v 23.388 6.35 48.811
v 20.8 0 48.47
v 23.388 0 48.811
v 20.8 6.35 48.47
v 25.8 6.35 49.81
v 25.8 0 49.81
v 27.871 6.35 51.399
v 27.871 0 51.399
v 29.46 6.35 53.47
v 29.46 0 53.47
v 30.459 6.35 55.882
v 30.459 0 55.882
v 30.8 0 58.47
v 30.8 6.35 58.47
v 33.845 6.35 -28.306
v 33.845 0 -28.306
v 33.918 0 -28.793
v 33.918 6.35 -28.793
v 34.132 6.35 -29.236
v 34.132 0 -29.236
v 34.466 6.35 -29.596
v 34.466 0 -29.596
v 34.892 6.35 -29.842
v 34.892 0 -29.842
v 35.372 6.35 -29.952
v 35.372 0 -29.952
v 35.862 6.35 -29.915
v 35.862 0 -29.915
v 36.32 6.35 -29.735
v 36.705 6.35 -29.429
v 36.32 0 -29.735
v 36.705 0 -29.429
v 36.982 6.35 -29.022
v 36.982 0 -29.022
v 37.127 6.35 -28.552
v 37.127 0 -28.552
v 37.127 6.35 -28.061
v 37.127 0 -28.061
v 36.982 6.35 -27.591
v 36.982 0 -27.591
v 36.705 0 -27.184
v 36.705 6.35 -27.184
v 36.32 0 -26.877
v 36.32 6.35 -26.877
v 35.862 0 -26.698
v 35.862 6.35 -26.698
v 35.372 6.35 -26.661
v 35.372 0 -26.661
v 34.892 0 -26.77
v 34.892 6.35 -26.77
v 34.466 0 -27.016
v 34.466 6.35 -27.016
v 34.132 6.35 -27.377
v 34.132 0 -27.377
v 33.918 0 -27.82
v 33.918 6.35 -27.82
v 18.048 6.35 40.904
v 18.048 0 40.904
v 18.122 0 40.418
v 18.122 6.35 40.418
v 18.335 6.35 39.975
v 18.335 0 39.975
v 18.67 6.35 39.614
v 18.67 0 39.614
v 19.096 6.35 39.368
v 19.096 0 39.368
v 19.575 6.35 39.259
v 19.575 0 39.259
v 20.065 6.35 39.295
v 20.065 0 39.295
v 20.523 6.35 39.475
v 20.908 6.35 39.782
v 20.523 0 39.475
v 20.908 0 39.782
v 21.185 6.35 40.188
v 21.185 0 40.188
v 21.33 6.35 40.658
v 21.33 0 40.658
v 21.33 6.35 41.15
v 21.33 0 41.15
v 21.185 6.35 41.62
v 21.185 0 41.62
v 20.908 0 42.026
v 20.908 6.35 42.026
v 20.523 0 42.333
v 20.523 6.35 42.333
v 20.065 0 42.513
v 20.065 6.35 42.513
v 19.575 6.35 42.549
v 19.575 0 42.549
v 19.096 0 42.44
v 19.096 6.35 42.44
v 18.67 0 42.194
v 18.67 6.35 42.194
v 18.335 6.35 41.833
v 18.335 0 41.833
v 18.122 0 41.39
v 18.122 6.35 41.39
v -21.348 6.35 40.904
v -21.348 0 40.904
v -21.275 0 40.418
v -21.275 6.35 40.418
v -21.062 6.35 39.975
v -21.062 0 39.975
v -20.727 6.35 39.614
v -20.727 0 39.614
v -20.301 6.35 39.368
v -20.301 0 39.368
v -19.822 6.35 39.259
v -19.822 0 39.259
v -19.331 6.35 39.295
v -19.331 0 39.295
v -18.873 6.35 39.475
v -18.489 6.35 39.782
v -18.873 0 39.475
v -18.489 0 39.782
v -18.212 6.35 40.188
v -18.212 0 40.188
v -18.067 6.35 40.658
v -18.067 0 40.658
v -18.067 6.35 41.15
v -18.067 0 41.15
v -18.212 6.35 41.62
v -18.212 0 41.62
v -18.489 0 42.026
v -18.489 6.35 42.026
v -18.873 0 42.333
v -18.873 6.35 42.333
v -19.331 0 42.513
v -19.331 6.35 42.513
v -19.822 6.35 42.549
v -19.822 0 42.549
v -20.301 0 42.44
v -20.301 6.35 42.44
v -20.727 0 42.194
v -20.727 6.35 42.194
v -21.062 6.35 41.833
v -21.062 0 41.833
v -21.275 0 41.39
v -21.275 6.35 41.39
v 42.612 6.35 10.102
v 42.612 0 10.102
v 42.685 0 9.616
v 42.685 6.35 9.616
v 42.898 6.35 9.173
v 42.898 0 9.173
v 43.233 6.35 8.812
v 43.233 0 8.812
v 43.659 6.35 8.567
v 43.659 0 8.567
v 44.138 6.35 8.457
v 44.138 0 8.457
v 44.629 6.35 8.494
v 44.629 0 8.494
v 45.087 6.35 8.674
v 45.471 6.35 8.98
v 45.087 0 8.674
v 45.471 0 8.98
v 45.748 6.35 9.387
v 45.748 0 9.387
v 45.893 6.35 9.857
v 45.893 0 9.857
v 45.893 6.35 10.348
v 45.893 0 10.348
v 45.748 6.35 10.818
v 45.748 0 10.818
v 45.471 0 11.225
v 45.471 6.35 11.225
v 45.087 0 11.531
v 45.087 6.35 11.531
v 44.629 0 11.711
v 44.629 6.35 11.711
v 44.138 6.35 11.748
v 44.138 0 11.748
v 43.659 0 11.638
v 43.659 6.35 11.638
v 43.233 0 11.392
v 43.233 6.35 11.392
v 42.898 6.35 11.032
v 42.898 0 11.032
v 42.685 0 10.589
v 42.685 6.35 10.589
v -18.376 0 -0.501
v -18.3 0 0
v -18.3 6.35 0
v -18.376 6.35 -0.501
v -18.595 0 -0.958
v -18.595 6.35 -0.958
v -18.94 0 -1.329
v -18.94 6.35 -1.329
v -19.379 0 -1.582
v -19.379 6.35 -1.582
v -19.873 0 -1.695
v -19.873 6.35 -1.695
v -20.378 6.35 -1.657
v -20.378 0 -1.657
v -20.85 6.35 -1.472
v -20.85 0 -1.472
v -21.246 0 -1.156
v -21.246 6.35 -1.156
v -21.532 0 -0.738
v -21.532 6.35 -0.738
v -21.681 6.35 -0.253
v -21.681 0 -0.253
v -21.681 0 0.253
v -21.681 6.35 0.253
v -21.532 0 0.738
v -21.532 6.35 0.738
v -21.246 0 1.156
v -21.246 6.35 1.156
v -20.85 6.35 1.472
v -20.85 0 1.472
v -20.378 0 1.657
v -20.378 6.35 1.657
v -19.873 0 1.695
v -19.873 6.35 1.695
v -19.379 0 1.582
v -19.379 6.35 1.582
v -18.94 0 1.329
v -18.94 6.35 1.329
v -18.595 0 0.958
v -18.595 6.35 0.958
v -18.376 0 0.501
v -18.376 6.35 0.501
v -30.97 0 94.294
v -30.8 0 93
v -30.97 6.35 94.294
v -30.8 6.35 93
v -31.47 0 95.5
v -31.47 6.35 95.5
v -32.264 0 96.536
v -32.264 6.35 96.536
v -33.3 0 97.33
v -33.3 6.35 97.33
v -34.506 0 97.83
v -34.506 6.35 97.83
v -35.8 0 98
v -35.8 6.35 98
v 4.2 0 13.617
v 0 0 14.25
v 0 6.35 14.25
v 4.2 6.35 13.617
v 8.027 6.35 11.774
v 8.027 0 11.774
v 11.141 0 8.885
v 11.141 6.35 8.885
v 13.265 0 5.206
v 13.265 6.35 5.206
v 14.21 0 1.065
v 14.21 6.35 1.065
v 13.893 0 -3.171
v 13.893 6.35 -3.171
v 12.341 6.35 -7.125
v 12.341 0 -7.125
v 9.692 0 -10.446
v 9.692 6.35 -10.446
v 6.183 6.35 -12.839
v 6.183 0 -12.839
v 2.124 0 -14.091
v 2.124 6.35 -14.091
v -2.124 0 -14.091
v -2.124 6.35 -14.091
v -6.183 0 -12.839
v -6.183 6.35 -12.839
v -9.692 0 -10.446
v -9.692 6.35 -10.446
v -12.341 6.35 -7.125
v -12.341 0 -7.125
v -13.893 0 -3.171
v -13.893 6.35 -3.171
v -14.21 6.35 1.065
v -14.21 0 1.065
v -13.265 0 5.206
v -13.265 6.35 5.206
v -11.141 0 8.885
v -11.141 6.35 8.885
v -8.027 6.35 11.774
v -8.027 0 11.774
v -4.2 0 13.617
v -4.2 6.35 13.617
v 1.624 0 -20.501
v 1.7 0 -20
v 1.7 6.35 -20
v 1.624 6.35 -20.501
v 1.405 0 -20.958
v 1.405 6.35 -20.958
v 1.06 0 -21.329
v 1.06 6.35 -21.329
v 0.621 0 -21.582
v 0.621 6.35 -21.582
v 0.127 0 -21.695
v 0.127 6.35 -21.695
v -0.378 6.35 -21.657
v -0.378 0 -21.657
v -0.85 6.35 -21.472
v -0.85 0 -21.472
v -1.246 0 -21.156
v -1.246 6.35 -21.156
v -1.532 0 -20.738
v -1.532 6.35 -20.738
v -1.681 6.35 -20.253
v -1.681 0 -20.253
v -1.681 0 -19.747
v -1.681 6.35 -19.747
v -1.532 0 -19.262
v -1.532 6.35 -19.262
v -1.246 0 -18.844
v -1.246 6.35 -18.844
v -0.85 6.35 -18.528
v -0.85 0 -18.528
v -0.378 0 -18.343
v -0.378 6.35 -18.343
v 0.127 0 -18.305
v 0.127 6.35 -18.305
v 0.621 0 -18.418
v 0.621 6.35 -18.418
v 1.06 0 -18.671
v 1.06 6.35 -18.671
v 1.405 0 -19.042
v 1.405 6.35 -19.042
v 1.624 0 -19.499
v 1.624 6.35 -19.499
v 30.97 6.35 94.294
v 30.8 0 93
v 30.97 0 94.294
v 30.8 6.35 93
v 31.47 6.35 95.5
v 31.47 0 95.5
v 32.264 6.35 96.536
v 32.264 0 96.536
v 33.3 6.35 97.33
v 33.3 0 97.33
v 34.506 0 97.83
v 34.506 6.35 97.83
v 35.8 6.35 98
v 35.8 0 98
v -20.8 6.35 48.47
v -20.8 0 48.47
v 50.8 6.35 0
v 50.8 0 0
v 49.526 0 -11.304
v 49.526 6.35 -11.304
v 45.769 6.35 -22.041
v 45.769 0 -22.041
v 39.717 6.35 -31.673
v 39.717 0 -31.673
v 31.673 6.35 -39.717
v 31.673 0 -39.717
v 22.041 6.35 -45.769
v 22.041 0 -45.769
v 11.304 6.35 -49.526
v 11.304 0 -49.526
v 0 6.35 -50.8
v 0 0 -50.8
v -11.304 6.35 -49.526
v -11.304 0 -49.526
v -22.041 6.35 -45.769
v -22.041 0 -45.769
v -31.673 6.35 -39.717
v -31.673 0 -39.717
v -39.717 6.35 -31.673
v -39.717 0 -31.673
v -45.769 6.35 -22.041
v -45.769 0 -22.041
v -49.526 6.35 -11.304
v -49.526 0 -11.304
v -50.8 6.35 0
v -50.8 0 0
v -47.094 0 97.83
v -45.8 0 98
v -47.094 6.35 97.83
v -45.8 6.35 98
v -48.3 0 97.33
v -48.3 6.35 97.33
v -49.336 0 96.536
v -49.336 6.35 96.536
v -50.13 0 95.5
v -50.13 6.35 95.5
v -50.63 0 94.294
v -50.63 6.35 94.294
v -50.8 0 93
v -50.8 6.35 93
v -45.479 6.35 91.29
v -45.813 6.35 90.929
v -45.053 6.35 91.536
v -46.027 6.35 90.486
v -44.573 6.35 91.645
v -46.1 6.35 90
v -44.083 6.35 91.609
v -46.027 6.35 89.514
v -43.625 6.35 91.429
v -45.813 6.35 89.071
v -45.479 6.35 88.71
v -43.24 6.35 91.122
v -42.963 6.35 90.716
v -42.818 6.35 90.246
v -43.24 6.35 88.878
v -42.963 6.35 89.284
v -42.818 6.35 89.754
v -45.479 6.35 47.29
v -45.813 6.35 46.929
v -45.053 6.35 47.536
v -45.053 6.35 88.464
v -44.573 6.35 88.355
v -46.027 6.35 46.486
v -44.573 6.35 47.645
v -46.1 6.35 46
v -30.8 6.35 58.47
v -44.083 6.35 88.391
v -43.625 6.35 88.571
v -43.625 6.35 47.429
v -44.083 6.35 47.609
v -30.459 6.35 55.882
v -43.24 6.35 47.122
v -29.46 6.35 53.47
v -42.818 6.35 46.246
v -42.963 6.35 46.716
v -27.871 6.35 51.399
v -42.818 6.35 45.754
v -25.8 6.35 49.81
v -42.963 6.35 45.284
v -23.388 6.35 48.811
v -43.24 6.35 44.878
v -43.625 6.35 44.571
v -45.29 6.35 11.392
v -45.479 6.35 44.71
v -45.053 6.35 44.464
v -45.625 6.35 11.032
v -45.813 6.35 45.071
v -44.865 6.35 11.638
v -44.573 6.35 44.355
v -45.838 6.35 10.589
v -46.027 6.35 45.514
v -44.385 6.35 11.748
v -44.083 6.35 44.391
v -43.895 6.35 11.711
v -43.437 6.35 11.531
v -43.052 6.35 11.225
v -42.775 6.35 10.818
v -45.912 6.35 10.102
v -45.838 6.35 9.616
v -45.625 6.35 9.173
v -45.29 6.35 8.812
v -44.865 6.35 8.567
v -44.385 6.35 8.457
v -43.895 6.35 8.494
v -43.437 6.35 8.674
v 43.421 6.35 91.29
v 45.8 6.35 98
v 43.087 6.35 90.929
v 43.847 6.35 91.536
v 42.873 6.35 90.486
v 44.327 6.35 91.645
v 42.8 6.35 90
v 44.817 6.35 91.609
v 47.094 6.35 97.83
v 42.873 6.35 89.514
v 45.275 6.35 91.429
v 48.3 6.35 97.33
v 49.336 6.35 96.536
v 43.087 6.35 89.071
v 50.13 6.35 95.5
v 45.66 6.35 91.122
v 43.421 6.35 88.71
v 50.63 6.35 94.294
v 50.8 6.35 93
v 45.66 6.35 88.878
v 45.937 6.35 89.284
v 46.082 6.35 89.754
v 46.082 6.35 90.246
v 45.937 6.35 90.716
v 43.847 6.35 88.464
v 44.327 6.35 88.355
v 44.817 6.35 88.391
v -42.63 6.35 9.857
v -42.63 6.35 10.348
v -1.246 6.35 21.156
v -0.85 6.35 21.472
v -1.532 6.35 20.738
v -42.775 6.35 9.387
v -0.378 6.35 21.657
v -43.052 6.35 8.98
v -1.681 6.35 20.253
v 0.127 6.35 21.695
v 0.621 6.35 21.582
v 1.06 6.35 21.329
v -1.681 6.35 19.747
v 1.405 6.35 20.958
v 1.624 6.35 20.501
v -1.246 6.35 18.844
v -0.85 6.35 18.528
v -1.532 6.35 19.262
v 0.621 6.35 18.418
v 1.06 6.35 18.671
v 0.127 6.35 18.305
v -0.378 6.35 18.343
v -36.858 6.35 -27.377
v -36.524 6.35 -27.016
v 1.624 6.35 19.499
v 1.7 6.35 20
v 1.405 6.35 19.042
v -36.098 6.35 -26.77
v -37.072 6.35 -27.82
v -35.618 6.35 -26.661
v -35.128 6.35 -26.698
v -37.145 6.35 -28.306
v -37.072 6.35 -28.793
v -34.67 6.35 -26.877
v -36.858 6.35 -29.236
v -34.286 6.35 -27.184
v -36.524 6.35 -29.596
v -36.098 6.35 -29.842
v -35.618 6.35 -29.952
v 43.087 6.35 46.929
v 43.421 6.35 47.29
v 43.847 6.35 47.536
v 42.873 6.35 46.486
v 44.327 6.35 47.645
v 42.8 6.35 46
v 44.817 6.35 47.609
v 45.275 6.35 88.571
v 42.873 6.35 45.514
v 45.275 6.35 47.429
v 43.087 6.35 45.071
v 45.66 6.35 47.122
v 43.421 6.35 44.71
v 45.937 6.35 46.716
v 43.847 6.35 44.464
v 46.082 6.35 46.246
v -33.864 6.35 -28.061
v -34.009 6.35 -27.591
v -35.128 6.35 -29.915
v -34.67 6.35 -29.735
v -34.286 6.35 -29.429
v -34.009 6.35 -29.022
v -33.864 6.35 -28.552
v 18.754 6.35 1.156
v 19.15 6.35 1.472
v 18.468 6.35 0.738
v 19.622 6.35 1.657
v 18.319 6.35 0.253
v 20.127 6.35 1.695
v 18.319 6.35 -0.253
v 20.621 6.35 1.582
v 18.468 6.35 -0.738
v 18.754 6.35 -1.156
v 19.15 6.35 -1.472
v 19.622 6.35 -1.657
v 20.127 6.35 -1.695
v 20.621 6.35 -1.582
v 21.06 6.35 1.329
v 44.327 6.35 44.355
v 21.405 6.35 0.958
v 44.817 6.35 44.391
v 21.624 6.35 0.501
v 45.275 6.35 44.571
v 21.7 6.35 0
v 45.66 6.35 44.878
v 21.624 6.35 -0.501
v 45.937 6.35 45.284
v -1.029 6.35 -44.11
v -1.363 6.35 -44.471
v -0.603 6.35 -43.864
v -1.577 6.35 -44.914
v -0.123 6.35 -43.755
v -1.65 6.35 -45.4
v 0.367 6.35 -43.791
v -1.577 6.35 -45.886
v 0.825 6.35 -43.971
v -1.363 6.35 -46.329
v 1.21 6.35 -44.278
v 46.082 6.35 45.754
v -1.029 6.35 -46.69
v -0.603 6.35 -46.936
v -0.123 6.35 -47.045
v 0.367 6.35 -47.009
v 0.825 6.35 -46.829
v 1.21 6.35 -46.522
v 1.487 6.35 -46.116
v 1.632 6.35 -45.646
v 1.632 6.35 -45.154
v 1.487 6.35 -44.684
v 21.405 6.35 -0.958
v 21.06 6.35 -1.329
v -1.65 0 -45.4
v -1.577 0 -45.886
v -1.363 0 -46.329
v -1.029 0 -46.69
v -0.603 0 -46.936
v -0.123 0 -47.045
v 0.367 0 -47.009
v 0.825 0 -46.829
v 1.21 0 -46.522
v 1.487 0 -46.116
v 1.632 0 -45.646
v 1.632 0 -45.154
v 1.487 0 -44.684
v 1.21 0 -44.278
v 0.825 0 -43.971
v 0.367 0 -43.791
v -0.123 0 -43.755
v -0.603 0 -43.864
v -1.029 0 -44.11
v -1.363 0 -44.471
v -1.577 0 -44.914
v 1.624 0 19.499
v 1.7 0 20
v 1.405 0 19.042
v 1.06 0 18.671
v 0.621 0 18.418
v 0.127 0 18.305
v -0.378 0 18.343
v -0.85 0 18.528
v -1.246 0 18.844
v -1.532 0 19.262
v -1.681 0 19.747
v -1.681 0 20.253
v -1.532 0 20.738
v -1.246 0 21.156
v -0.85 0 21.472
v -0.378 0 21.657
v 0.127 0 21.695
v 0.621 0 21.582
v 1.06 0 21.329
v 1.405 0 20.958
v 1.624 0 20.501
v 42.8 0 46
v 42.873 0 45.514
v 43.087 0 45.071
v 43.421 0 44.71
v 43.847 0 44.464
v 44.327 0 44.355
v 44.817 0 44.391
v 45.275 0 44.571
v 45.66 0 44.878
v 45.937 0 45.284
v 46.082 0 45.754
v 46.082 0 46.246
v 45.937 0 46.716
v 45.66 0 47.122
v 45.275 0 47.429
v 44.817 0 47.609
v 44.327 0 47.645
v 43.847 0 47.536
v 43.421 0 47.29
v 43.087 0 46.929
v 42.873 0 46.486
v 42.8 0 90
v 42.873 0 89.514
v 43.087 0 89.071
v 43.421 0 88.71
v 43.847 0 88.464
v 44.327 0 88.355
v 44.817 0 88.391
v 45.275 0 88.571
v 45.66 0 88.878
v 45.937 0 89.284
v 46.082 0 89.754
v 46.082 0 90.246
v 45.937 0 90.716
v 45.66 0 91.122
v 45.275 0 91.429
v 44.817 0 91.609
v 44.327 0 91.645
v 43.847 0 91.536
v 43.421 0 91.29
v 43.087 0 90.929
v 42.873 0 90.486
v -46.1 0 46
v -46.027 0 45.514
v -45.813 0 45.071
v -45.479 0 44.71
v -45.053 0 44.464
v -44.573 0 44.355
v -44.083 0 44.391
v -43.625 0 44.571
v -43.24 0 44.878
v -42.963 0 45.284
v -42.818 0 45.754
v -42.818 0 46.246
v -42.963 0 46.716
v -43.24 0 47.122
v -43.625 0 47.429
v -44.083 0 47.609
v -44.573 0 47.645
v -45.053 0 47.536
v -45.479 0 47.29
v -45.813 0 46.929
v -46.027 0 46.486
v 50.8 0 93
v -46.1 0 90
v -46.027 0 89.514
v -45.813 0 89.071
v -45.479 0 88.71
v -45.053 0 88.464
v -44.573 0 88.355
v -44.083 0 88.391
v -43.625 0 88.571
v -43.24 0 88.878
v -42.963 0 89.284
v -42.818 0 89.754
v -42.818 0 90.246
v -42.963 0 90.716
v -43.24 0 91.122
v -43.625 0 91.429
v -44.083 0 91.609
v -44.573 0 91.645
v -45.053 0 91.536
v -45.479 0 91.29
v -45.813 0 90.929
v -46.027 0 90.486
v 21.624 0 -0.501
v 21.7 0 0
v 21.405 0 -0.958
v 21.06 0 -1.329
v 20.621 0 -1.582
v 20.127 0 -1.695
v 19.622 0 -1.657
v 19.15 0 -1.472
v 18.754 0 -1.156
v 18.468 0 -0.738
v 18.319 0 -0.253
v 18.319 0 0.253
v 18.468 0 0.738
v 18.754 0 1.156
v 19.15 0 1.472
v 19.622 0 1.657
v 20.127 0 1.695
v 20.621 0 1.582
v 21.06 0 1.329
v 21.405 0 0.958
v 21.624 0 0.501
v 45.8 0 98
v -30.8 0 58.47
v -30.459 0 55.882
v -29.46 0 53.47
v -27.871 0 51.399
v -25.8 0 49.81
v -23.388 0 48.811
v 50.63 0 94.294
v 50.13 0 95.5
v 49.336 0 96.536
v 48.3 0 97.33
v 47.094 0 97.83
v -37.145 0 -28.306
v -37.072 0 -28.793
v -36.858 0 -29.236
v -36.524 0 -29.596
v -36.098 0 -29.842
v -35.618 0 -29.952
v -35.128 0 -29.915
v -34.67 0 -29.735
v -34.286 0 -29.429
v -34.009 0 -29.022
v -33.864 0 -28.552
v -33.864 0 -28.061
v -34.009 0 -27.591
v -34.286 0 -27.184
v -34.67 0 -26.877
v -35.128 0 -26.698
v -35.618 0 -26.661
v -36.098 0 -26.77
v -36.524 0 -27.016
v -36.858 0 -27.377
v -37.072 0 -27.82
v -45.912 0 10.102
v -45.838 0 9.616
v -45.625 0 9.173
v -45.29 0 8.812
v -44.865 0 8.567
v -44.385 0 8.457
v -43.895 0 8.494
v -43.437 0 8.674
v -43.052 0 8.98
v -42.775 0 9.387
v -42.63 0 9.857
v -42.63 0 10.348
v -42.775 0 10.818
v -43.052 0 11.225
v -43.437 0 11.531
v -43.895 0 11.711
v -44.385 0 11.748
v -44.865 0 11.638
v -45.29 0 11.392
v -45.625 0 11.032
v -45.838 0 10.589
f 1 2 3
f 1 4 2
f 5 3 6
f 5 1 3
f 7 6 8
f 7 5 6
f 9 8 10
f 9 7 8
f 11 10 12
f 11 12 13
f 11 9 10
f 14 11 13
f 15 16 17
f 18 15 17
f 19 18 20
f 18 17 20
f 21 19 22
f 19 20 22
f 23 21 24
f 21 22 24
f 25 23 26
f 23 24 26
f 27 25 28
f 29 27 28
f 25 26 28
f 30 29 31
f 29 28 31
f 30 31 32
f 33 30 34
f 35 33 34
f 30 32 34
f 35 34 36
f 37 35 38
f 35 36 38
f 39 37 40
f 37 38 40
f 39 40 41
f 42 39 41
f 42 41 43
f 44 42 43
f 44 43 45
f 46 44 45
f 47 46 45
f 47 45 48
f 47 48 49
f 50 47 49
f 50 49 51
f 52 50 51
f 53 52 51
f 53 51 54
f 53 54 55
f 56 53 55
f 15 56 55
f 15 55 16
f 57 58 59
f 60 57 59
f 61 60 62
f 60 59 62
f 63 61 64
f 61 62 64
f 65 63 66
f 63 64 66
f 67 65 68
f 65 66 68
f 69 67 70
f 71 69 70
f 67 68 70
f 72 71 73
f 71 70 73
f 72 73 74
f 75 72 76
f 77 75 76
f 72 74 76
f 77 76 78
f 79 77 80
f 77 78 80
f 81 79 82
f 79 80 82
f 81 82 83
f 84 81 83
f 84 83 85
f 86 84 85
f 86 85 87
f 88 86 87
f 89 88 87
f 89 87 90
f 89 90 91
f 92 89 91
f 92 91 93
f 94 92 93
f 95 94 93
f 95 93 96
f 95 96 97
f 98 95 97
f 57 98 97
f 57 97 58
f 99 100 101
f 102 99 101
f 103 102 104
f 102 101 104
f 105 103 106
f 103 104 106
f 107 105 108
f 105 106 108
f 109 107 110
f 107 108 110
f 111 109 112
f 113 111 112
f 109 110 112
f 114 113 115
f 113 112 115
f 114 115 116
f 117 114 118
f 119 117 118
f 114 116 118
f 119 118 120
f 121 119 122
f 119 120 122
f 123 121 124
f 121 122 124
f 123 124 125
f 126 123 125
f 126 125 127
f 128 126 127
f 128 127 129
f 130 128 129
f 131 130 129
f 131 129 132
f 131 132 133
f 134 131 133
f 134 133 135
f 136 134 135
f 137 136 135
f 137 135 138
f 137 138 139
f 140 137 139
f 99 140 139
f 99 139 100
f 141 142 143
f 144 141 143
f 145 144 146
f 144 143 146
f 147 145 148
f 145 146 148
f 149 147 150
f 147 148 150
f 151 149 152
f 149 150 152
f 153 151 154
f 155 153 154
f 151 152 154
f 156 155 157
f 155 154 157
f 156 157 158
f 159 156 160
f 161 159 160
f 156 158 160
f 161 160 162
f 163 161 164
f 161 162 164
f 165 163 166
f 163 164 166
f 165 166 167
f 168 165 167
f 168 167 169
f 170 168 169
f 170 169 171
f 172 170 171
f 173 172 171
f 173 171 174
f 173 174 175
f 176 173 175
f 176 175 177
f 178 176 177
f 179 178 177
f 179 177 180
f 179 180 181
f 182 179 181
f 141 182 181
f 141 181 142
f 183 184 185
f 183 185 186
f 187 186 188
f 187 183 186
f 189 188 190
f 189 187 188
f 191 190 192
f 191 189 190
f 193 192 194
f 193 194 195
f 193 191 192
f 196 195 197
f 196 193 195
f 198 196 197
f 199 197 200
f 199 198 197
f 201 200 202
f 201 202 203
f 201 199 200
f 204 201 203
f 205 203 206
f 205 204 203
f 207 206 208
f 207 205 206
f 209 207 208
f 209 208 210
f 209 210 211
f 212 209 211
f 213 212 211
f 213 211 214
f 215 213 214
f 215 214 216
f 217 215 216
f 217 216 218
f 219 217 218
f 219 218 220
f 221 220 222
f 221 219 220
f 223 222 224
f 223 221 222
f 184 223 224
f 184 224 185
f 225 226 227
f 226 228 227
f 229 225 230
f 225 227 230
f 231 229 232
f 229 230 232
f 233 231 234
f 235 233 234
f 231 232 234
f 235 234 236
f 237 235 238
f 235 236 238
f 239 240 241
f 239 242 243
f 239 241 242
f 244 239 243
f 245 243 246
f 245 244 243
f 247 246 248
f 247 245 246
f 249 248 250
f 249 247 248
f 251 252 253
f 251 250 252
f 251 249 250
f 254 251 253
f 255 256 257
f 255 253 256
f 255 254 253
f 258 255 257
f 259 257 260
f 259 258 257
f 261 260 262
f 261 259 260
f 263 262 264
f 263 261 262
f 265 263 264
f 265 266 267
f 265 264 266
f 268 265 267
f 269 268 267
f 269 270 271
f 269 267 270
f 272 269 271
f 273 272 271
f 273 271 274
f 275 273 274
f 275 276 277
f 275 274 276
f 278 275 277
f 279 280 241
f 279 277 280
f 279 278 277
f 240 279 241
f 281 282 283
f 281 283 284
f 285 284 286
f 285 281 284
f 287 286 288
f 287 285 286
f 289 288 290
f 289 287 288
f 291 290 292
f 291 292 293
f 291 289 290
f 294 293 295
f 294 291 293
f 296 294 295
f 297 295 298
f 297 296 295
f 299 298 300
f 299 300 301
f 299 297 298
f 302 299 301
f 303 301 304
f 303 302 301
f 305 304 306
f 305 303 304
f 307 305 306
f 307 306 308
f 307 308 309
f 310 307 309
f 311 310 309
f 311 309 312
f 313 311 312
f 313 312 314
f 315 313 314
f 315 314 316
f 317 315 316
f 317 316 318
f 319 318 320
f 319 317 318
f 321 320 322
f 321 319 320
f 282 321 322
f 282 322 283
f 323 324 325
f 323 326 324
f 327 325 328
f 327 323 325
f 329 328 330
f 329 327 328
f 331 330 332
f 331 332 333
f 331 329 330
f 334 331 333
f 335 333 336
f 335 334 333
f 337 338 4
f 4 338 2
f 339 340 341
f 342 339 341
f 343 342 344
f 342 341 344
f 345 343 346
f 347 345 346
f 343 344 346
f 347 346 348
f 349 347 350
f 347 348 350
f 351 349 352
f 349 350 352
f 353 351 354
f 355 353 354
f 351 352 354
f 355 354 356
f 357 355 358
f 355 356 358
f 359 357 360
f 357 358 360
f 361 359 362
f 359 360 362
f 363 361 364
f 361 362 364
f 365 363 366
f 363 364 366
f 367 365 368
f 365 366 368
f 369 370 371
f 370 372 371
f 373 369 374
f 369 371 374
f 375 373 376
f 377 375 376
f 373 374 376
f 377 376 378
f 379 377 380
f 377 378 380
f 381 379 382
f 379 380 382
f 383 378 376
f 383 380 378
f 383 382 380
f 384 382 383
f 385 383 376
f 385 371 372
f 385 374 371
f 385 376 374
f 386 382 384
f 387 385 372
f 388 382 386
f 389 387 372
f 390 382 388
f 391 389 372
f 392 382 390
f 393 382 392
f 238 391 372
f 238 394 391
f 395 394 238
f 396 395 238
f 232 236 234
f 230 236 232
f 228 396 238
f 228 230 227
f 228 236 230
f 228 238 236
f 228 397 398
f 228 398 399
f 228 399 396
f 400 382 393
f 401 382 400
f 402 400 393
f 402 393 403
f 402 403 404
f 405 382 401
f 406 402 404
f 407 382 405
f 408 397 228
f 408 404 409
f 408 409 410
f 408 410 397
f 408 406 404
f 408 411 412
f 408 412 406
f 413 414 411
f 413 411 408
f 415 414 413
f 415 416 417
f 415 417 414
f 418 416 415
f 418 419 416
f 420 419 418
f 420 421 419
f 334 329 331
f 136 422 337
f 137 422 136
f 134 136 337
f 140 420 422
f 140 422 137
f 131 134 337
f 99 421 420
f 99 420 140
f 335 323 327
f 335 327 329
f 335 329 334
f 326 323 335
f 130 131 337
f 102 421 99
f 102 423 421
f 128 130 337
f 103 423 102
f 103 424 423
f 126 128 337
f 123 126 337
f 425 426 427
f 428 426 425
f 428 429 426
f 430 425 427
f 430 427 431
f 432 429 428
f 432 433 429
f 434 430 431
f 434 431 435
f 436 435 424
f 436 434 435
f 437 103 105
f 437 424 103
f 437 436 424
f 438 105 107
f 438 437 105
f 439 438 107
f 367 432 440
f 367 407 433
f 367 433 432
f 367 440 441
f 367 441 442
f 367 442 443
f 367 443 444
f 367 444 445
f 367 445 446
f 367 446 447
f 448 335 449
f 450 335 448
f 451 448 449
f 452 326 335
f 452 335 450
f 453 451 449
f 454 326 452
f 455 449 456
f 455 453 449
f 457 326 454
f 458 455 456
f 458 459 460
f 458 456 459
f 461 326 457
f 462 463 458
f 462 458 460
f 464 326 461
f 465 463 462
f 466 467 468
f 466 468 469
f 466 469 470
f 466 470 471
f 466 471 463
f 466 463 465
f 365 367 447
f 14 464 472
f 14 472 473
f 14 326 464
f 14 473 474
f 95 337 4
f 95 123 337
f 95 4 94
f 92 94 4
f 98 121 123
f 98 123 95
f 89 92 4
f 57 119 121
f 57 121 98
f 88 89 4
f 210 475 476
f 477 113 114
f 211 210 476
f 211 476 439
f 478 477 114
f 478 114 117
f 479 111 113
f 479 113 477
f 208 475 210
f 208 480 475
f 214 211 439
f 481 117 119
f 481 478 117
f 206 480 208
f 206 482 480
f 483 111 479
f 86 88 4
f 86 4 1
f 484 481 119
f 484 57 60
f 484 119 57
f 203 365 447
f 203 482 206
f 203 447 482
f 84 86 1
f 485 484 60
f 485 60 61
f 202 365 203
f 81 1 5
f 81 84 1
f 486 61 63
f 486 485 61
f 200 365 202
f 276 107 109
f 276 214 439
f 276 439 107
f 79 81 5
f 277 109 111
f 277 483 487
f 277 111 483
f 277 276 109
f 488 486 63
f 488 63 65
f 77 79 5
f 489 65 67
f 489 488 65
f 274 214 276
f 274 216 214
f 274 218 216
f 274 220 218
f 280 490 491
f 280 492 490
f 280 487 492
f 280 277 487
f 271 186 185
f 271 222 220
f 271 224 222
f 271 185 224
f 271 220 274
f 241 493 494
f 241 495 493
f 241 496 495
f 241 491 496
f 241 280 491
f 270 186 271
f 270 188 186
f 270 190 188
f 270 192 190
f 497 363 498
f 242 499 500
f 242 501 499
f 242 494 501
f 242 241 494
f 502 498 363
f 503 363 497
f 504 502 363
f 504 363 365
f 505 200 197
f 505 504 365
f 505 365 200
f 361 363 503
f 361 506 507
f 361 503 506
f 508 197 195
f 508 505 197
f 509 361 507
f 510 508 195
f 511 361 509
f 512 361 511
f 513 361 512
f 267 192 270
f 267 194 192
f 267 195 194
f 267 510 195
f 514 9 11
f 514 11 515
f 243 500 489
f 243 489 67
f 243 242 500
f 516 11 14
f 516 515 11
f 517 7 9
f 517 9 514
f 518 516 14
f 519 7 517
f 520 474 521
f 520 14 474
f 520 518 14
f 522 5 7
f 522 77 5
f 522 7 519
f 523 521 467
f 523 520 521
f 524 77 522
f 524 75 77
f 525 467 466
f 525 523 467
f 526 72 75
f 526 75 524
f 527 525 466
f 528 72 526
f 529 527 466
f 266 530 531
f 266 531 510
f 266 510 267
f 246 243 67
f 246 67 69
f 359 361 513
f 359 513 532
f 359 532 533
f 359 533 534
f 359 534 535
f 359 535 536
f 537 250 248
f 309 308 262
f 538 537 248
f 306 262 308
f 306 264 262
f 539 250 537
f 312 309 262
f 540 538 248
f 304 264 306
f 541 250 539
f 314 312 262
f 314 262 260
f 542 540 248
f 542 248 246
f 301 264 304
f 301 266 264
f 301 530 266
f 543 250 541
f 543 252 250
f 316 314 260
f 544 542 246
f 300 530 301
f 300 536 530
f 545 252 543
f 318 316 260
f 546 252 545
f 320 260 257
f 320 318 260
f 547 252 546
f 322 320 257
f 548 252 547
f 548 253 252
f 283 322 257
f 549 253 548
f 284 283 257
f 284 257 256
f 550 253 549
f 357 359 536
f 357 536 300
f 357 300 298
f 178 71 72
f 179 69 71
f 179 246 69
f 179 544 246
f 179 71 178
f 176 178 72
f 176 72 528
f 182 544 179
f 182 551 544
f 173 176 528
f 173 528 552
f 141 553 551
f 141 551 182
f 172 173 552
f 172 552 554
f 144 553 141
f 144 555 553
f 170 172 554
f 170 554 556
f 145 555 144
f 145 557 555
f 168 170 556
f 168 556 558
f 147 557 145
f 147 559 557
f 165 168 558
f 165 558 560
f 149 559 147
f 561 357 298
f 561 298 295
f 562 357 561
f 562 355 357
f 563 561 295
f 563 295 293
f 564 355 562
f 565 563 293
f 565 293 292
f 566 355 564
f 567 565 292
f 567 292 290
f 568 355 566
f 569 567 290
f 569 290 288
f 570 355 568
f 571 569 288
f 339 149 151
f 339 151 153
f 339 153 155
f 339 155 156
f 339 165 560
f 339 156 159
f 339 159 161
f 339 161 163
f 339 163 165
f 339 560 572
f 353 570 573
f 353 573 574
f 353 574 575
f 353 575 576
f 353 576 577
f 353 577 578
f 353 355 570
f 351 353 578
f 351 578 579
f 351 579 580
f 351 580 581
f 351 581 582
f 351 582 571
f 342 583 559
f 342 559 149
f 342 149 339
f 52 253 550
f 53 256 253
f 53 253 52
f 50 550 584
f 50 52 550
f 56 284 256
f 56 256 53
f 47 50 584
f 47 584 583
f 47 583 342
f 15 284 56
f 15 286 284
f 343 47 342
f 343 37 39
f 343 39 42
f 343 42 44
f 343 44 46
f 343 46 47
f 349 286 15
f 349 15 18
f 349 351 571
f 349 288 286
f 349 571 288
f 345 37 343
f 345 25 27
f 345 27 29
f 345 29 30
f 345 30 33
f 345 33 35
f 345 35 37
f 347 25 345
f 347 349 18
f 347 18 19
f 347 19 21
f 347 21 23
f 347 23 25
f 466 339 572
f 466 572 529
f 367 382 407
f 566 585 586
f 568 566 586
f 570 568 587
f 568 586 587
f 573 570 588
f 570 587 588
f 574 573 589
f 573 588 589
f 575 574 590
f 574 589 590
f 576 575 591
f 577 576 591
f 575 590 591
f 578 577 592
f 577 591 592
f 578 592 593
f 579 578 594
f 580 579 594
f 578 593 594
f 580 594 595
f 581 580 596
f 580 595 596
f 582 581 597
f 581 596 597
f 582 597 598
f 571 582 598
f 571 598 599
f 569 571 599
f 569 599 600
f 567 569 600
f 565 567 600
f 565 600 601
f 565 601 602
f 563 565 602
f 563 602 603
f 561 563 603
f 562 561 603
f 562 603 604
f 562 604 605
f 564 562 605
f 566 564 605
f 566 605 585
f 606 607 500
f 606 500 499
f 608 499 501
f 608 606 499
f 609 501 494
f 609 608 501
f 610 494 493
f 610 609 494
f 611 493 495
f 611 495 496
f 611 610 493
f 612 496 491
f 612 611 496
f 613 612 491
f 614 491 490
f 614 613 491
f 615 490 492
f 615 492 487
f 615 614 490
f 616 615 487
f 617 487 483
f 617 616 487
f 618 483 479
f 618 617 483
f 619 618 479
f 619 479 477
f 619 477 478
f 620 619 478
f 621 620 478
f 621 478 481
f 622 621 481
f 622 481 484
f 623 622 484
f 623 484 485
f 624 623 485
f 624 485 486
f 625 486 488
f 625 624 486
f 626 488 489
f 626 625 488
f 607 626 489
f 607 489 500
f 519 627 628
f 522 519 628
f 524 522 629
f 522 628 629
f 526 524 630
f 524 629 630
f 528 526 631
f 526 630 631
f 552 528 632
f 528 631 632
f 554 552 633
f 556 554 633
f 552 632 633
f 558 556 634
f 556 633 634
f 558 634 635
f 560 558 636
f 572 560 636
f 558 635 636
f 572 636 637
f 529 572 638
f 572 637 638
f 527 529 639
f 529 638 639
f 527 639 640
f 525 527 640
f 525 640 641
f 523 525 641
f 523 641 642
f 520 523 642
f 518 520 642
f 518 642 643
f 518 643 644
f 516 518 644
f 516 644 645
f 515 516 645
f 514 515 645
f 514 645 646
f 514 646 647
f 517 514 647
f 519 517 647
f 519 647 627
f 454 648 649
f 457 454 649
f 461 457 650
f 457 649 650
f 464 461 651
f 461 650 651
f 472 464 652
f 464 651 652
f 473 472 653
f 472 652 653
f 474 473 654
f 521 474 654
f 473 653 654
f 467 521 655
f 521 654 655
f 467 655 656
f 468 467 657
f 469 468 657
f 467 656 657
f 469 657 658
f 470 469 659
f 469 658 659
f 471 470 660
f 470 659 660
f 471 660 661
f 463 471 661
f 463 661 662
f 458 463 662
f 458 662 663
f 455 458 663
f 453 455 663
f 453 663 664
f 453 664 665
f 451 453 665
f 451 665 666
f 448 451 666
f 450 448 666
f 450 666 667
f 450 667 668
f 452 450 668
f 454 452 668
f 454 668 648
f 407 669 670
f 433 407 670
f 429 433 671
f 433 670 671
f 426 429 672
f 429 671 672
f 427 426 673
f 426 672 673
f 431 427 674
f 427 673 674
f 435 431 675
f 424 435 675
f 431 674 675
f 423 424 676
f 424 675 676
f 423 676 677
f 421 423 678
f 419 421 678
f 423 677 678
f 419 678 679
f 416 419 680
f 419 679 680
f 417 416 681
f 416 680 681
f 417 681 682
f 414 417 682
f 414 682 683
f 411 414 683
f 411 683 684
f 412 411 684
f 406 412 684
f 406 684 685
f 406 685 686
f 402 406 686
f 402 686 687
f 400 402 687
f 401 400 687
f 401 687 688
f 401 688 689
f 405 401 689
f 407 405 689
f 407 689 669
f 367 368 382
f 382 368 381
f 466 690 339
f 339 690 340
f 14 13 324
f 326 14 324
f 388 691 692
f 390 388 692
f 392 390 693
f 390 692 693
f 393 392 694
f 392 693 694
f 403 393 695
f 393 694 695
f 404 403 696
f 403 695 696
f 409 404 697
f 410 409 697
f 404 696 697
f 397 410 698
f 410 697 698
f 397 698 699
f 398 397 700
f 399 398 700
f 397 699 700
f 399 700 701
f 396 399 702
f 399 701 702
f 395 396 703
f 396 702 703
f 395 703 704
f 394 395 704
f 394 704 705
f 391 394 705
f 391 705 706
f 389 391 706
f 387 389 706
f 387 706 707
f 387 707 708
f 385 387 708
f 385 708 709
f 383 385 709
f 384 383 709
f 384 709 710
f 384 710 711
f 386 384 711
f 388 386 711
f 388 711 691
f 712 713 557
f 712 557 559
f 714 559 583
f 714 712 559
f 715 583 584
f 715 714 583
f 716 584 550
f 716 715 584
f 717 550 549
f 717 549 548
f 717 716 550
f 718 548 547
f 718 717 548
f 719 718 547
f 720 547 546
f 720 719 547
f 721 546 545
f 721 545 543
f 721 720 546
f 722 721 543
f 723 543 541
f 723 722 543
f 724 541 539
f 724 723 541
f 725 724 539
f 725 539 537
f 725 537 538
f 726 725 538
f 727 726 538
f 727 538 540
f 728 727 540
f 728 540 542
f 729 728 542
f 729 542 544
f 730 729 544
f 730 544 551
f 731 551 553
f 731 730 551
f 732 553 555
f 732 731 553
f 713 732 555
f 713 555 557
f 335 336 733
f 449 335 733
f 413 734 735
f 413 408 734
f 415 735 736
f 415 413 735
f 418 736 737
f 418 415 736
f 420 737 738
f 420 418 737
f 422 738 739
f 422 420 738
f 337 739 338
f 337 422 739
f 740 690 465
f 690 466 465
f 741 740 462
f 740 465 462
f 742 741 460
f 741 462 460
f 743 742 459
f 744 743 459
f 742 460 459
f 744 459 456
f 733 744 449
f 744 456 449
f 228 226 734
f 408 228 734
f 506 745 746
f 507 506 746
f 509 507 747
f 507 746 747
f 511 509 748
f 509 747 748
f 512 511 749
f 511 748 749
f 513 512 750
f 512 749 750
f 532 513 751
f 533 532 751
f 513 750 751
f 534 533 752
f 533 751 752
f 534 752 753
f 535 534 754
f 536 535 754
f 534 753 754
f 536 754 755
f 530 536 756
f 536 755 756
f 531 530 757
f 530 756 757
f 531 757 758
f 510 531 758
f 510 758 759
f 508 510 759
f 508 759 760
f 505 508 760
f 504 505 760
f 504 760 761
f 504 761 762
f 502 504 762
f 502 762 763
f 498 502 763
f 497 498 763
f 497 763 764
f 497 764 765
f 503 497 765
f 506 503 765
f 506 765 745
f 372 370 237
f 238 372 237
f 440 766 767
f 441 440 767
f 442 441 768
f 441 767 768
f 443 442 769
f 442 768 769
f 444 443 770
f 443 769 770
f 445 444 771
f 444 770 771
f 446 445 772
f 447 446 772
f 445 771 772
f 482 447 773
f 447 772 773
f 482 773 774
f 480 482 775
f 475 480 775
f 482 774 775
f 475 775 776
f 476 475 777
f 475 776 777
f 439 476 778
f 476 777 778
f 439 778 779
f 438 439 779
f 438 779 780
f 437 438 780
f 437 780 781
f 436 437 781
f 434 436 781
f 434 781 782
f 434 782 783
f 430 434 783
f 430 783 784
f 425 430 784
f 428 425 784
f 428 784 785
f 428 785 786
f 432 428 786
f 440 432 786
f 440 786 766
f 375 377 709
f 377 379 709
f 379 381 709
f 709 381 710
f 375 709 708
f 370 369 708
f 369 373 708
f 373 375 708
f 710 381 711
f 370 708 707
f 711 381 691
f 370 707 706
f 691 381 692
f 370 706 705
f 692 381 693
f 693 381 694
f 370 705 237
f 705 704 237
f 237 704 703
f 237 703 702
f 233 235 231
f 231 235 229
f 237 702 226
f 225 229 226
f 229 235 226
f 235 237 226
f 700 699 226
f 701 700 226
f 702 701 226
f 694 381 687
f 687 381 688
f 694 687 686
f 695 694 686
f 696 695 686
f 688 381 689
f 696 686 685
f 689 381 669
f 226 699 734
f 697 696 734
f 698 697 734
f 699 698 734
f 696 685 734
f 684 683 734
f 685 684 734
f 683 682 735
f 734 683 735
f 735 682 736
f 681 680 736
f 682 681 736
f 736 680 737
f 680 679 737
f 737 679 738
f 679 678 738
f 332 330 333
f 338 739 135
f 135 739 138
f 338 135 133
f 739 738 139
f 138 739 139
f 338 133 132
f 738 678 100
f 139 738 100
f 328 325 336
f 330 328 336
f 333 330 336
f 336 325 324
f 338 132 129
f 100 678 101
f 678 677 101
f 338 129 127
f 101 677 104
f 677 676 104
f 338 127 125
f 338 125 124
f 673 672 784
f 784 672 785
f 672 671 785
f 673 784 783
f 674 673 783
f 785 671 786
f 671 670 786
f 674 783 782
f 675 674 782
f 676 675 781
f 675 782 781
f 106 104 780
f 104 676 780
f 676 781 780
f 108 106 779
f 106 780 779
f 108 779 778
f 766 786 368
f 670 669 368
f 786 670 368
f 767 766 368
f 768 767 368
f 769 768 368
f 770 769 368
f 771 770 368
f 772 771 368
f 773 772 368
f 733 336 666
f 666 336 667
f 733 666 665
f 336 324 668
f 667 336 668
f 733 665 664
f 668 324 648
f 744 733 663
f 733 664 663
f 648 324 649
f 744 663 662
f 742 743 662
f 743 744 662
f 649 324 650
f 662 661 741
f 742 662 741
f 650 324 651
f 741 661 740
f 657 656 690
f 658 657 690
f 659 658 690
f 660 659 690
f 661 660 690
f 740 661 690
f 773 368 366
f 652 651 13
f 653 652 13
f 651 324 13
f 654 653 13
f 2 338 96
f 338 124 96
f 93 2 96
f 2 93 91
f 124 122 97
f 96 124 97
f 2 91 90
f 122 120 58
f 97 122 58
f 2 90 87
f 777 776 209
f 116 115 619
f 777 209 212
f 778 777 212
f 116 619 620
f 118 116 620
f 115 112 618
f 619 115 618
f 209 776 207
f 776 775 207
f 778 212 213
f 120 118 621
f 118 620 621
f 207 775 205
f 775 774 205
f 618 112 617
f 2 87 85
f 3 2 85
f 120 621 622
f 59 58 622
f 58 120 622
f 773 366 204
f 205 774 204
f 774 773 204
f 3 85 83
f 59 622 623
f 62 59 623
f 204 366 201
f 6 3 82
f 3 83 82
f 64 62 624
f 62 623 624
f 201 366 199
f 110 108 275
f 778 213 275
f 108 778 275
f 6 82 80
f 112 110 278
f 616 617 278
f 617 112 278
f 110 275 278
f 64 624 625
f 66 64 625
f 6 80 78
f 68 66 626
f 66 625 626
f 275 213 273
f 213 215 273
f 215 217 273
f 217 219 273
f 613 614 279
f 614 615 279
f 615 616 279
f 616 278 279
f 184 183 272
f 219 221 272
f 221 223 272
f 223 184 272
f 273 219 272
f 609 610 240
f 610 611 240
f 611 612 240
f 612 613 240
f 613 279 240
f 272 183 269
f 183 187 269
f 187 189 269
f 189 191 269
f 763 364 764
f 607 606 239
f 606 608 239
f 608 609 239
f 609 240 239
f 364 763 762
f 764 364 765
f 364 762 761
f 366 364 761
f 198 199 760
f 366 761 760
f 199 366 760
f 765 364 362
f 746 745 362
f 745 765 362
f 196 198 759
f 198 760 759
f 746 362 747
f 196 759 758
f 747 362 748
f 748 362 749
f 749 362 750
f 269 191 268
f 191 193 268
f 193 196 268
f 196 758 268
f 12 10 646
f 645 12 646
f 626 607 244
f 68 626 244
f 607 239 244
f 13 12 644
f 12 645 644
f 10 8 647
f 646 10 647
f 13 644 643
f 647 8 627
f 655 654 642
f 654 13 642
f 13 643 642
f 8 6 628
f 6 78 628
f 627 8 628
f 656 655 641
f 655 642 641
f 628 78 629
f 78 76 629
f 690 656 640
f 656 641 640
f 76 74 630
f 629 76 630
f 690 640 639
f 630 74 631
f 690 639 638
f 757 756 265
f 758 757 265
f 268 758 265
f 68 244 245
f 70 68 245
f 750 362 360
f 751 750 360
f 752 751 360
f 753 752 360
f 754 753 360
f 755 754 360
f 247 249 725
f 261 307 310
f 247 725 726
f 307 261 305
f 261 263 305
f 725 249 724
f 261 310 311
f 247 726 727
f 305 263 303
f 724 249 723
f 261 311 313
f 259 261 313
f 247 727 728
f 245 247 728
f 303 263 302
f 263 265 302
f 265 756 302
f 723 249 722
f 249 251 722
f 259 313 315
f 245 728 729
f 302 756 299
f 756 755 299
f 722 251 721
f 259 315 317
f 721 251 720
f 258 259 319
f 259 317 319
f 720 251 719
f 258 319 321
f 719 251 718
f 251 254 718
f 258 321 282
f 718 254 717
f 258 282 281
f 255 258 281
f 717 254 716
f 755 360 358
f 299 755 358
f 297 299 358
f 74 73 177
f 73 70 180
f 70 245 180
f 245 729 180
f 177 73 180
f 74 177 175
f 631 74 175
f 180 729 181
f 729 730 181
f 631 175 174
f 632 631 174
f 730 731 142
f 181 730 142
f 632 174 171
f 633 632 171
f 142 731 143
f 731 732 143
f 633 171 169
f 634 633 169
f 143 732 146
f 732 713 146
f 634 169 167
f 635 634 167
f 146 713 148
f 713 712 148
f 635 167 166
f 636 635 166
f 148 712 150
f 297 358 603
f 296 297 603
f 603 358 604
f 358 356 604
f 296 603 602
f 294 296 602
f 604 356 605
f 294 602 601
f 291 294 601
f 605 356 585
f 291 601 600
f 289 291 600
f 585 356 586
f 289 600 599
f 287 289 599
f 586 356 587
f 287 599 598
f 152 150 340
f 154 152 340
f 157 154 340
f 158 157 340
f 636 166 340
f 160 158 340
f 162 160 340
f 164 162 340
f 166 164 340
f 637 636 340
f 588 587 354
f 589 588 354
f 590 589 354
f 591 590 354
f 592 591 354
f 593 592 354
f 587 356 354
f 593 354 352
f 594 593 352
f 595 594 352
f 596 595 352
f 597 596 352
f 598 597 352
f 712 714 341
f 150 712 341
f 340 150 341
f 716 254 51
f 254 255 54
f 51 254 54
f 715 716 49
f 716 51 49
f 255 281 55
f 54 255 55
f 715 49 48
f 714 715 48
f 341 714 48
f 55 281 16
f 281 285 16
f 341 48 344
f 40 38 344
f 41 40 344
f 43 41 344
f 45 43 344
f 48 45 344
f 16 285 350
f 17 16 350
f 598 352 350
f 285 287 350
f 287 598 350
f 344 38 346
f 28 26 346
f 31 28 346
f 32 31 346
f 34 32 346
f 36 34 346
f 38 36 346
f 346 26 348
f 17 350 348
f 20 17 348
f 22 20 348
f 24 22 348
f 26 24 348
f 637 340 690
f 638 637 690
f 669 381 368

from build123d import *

# Parameters (mm, degrees)
BOSS_EXTRUDE1_DEPTH          = 6.35
FILLET1_R                    = 10
M4X0_7_TAPPED_HOLE1_D        = 3.3
M4X0_7_TAPPED_HOLE2_D        = 3.3
FILLET2_R                    = 5
CUT_EXTRUDE1_DEPTH           = 111.566552356
CUT_EXTRUDE1_DEPTH_BACK      = 111.566552356
SKETCH10_R                   = 14.25
M3_CLEARANCE_HOLE1_OUTLINE_R = 1.7
M3_CLEARANCE_HOLE1_DEPTH     = 6.35


# Read off the part's stored shape, not the designer's step: M3 Clearance Hole1
with BuildPart() as part:
    # Sketch2 → Boss-Extrude1 (new body)
    with BuildSketch(Plane(origin=(0, 0, 0), x_dir=(1, 0, 0), z_dir=(0, 1, 0))):
        with BuildLine():
            Line((-36.071416662, -35.77), (-50.8, -35.77))
            Line((-50.8, -35.77), (-50.8, -98))
            Line((-50.8, -98), (-30.8, -98))
            Line((-30.8, -98), (-30.8, -48.47))
            Line((-30.8, -48.47), (-15.208520638, -48.47))
            ThreePointArc((-15.208520638, -48.47), (-26.414588628, -43.392505201), (-36.071416662, -35.77))
        make_face()
        with BuildLine():
            Line((0, -35.77), (-36.071416662, -35.77))
            ThreePointArc((-36.071416662, -35.77), (-26.414588628, -43.392505201), (-15.208520638, -48.47))
            Line((-15.208520638, -48.47), (0, -48.47))
            Line((0, -48.47), (0, -35.77))
        make_face()
        with BuildLine():
            Line((36.071416662, -35.77), (0, -35.77))
            Line((0, -35.77), (0, -48.47))
            Line((0, -48.47), (15.208520638, -48.47))
            ThreePointArc((15.208520638, -48.47), (26.414588628, -43.392505201), (36.071416662, -35.77))
        make_face()
        with BuildLine():
            Line((50.8, -98), (50.8, -35.77))
            Line((50.8, -35.77), (36.071416662, -35.77))
            ThreePointArc((36.071416662, -35.77), (26.414588628, -43.392505201), (15.208520638, -48.47))
            Line((15.208520638, -48.47), (30.8, -48.47))
            Line((30.8, -48.47), (30.8, -98))
            Line((30.8, -98), (50.8, -98))
        make_face()
        with BuildLine():
            Line((50.8, -35.77), (50.8, 0))
            ThreePointArc((50.8, 0), (46.973758453, -19.34182041), (36.071416662, -35.77))
            Line((36.071416662, -35.77), (50.8, -35.77))
        make_face()
        with BuildLine():
            Line((50.8, 0), (0, 0))
            Line((0, 0), (0, -35.77))
            Line((0, -35.77), (36.071416662, -35.77))
            ThreePointArc((36.071416662, -35.77), (46.973758453, -19.34182041), (50.8, 0))
        make_face()
        with BuildLine():
            ThreePointArc((50.8, 0), (0, 50.8), (-50.8, 0))
            Line((-50.8, 0), (0, 0))
            Line((0, 0), (50.8, 0))
        make_face()
        with BuildLine():
            Line((0, 0), (-50.8, 0))
            ThreePointArc((-50.8, 0), (-46.973758453, -19.34182041), (-36.071416662, -35.77))
            Line((-36.071416662, -35.77), (0, -35.77))
            Line((0, -35.77), (0, 0))
        make_face()
        with BuildLine():
            ThreePointArc((-36.071416662, -35.77), (-46.973758453, -19.34182041), (-50.8, 0))
            Line((-50.8, 0), (-50.8, -35.77))
            Line((-50.8, -35.77), (-36.071416662, -35.77))
        make_face()
    extrude(amount=BOSS_EXTRUDE1_DEPTH)

    # Fillet1
    fillet1_edges = [part.edges().sort_by_distance(p)[0] for p in [
        (30.8, 3.175, 48.47),
        (-30.8, 3.175, 48.47),
    ]]
    fillet(fillet1_edges, radius=FILLET1_R)

    # M4x0.7 Tapped Hole1 (through all)
    with Locations(Plane(origin=(0, 6.35, 0), x_dir=(1, 0, 0), z_dir=(0, 1, 0))):
        with Locations((-44.45, -46), (-44.45, -90), (44.45, -90), (44.45, -46)):
            Hole(M4X0_7_TAPPED_HOLE1_D / 2)

    # M4x0.7 Tapped Hole2 (through all)
    with Locations(Plane(origin=(0, 6.35, 0), x_dir=(1, 0, 0), z_dir=(0, 1, 0))):
        with Locations((-19.698321756, -40.903986603), (19.698321756, -40.903986603), (-44.261727213, -10.102450402), (-35.495149304, 28.306437004), (0, 45.4), (35.495149304, 28.306437004), (44.261727213, -10.102450402)):
            Hole(M4X0_7_TAPPED_HOLE2_D / 2)

    # Fillet2
    fillet2_edges = [part.edges().sort_by_distance(p)[0] for p in [
        (50.8, 3.175, 98),
        (30.8, 3.175, 98),
        (-30.8, 3.175, 98),
        (-50.8, 3.175, 98),
    ]]
    fillet(fillet2_edges, radius=FILLET2_R)

    # Sketch10 → Cut-Extrude1 (cut, two sides: drawn at the far end of the back side and taken through both)
    with BuildSketch(Plane(origin=(0, 6.35, 0), x_dir=(1, 0, 0), z_dir=(0, 1, 0)).offset(-CUT_EXTRUDE1_DEPTH_BACK)):
        with Locations(Location((0, 0, 0), (0, 0, 270))):
            Circle(SKETCH10_R)
    extrude(amount=CUT_EXTRUDE1_DEPTH + CUT_EXTRUDE1_DEPTH_BACK, mode=Mode.SUBTRACT)

    # M3 Clearance Hole1 outline → M3 Clearance Hole1 (cut)
    with BuildSketch(Plane(origin=(0, 0, 0), x_dir=(1, 0, 0), z_dir=(0, 1, 0))):
        with Locations((-20, 0)):
            Circle(M3_CLEARANCE_HOLE1_OUTLINE_R)
        with Locations((20, 0)):
            Circle(M3_CLEARANCE_HOLE1_OUTLINE_R)
        with Locations((0, 20)):
            Circle(M3_CLEARANCE_HOLE1_OUTLINE_R)
        with Locations((0, -20)):
            Circle(M3_CLEARANCE_HOLE1_OUTLINE_R)
    extrude(amount=M3_CLEARANCE_HOLE1_DEPTH, mode=Mode.SUBTRACT)


solid = part.part
